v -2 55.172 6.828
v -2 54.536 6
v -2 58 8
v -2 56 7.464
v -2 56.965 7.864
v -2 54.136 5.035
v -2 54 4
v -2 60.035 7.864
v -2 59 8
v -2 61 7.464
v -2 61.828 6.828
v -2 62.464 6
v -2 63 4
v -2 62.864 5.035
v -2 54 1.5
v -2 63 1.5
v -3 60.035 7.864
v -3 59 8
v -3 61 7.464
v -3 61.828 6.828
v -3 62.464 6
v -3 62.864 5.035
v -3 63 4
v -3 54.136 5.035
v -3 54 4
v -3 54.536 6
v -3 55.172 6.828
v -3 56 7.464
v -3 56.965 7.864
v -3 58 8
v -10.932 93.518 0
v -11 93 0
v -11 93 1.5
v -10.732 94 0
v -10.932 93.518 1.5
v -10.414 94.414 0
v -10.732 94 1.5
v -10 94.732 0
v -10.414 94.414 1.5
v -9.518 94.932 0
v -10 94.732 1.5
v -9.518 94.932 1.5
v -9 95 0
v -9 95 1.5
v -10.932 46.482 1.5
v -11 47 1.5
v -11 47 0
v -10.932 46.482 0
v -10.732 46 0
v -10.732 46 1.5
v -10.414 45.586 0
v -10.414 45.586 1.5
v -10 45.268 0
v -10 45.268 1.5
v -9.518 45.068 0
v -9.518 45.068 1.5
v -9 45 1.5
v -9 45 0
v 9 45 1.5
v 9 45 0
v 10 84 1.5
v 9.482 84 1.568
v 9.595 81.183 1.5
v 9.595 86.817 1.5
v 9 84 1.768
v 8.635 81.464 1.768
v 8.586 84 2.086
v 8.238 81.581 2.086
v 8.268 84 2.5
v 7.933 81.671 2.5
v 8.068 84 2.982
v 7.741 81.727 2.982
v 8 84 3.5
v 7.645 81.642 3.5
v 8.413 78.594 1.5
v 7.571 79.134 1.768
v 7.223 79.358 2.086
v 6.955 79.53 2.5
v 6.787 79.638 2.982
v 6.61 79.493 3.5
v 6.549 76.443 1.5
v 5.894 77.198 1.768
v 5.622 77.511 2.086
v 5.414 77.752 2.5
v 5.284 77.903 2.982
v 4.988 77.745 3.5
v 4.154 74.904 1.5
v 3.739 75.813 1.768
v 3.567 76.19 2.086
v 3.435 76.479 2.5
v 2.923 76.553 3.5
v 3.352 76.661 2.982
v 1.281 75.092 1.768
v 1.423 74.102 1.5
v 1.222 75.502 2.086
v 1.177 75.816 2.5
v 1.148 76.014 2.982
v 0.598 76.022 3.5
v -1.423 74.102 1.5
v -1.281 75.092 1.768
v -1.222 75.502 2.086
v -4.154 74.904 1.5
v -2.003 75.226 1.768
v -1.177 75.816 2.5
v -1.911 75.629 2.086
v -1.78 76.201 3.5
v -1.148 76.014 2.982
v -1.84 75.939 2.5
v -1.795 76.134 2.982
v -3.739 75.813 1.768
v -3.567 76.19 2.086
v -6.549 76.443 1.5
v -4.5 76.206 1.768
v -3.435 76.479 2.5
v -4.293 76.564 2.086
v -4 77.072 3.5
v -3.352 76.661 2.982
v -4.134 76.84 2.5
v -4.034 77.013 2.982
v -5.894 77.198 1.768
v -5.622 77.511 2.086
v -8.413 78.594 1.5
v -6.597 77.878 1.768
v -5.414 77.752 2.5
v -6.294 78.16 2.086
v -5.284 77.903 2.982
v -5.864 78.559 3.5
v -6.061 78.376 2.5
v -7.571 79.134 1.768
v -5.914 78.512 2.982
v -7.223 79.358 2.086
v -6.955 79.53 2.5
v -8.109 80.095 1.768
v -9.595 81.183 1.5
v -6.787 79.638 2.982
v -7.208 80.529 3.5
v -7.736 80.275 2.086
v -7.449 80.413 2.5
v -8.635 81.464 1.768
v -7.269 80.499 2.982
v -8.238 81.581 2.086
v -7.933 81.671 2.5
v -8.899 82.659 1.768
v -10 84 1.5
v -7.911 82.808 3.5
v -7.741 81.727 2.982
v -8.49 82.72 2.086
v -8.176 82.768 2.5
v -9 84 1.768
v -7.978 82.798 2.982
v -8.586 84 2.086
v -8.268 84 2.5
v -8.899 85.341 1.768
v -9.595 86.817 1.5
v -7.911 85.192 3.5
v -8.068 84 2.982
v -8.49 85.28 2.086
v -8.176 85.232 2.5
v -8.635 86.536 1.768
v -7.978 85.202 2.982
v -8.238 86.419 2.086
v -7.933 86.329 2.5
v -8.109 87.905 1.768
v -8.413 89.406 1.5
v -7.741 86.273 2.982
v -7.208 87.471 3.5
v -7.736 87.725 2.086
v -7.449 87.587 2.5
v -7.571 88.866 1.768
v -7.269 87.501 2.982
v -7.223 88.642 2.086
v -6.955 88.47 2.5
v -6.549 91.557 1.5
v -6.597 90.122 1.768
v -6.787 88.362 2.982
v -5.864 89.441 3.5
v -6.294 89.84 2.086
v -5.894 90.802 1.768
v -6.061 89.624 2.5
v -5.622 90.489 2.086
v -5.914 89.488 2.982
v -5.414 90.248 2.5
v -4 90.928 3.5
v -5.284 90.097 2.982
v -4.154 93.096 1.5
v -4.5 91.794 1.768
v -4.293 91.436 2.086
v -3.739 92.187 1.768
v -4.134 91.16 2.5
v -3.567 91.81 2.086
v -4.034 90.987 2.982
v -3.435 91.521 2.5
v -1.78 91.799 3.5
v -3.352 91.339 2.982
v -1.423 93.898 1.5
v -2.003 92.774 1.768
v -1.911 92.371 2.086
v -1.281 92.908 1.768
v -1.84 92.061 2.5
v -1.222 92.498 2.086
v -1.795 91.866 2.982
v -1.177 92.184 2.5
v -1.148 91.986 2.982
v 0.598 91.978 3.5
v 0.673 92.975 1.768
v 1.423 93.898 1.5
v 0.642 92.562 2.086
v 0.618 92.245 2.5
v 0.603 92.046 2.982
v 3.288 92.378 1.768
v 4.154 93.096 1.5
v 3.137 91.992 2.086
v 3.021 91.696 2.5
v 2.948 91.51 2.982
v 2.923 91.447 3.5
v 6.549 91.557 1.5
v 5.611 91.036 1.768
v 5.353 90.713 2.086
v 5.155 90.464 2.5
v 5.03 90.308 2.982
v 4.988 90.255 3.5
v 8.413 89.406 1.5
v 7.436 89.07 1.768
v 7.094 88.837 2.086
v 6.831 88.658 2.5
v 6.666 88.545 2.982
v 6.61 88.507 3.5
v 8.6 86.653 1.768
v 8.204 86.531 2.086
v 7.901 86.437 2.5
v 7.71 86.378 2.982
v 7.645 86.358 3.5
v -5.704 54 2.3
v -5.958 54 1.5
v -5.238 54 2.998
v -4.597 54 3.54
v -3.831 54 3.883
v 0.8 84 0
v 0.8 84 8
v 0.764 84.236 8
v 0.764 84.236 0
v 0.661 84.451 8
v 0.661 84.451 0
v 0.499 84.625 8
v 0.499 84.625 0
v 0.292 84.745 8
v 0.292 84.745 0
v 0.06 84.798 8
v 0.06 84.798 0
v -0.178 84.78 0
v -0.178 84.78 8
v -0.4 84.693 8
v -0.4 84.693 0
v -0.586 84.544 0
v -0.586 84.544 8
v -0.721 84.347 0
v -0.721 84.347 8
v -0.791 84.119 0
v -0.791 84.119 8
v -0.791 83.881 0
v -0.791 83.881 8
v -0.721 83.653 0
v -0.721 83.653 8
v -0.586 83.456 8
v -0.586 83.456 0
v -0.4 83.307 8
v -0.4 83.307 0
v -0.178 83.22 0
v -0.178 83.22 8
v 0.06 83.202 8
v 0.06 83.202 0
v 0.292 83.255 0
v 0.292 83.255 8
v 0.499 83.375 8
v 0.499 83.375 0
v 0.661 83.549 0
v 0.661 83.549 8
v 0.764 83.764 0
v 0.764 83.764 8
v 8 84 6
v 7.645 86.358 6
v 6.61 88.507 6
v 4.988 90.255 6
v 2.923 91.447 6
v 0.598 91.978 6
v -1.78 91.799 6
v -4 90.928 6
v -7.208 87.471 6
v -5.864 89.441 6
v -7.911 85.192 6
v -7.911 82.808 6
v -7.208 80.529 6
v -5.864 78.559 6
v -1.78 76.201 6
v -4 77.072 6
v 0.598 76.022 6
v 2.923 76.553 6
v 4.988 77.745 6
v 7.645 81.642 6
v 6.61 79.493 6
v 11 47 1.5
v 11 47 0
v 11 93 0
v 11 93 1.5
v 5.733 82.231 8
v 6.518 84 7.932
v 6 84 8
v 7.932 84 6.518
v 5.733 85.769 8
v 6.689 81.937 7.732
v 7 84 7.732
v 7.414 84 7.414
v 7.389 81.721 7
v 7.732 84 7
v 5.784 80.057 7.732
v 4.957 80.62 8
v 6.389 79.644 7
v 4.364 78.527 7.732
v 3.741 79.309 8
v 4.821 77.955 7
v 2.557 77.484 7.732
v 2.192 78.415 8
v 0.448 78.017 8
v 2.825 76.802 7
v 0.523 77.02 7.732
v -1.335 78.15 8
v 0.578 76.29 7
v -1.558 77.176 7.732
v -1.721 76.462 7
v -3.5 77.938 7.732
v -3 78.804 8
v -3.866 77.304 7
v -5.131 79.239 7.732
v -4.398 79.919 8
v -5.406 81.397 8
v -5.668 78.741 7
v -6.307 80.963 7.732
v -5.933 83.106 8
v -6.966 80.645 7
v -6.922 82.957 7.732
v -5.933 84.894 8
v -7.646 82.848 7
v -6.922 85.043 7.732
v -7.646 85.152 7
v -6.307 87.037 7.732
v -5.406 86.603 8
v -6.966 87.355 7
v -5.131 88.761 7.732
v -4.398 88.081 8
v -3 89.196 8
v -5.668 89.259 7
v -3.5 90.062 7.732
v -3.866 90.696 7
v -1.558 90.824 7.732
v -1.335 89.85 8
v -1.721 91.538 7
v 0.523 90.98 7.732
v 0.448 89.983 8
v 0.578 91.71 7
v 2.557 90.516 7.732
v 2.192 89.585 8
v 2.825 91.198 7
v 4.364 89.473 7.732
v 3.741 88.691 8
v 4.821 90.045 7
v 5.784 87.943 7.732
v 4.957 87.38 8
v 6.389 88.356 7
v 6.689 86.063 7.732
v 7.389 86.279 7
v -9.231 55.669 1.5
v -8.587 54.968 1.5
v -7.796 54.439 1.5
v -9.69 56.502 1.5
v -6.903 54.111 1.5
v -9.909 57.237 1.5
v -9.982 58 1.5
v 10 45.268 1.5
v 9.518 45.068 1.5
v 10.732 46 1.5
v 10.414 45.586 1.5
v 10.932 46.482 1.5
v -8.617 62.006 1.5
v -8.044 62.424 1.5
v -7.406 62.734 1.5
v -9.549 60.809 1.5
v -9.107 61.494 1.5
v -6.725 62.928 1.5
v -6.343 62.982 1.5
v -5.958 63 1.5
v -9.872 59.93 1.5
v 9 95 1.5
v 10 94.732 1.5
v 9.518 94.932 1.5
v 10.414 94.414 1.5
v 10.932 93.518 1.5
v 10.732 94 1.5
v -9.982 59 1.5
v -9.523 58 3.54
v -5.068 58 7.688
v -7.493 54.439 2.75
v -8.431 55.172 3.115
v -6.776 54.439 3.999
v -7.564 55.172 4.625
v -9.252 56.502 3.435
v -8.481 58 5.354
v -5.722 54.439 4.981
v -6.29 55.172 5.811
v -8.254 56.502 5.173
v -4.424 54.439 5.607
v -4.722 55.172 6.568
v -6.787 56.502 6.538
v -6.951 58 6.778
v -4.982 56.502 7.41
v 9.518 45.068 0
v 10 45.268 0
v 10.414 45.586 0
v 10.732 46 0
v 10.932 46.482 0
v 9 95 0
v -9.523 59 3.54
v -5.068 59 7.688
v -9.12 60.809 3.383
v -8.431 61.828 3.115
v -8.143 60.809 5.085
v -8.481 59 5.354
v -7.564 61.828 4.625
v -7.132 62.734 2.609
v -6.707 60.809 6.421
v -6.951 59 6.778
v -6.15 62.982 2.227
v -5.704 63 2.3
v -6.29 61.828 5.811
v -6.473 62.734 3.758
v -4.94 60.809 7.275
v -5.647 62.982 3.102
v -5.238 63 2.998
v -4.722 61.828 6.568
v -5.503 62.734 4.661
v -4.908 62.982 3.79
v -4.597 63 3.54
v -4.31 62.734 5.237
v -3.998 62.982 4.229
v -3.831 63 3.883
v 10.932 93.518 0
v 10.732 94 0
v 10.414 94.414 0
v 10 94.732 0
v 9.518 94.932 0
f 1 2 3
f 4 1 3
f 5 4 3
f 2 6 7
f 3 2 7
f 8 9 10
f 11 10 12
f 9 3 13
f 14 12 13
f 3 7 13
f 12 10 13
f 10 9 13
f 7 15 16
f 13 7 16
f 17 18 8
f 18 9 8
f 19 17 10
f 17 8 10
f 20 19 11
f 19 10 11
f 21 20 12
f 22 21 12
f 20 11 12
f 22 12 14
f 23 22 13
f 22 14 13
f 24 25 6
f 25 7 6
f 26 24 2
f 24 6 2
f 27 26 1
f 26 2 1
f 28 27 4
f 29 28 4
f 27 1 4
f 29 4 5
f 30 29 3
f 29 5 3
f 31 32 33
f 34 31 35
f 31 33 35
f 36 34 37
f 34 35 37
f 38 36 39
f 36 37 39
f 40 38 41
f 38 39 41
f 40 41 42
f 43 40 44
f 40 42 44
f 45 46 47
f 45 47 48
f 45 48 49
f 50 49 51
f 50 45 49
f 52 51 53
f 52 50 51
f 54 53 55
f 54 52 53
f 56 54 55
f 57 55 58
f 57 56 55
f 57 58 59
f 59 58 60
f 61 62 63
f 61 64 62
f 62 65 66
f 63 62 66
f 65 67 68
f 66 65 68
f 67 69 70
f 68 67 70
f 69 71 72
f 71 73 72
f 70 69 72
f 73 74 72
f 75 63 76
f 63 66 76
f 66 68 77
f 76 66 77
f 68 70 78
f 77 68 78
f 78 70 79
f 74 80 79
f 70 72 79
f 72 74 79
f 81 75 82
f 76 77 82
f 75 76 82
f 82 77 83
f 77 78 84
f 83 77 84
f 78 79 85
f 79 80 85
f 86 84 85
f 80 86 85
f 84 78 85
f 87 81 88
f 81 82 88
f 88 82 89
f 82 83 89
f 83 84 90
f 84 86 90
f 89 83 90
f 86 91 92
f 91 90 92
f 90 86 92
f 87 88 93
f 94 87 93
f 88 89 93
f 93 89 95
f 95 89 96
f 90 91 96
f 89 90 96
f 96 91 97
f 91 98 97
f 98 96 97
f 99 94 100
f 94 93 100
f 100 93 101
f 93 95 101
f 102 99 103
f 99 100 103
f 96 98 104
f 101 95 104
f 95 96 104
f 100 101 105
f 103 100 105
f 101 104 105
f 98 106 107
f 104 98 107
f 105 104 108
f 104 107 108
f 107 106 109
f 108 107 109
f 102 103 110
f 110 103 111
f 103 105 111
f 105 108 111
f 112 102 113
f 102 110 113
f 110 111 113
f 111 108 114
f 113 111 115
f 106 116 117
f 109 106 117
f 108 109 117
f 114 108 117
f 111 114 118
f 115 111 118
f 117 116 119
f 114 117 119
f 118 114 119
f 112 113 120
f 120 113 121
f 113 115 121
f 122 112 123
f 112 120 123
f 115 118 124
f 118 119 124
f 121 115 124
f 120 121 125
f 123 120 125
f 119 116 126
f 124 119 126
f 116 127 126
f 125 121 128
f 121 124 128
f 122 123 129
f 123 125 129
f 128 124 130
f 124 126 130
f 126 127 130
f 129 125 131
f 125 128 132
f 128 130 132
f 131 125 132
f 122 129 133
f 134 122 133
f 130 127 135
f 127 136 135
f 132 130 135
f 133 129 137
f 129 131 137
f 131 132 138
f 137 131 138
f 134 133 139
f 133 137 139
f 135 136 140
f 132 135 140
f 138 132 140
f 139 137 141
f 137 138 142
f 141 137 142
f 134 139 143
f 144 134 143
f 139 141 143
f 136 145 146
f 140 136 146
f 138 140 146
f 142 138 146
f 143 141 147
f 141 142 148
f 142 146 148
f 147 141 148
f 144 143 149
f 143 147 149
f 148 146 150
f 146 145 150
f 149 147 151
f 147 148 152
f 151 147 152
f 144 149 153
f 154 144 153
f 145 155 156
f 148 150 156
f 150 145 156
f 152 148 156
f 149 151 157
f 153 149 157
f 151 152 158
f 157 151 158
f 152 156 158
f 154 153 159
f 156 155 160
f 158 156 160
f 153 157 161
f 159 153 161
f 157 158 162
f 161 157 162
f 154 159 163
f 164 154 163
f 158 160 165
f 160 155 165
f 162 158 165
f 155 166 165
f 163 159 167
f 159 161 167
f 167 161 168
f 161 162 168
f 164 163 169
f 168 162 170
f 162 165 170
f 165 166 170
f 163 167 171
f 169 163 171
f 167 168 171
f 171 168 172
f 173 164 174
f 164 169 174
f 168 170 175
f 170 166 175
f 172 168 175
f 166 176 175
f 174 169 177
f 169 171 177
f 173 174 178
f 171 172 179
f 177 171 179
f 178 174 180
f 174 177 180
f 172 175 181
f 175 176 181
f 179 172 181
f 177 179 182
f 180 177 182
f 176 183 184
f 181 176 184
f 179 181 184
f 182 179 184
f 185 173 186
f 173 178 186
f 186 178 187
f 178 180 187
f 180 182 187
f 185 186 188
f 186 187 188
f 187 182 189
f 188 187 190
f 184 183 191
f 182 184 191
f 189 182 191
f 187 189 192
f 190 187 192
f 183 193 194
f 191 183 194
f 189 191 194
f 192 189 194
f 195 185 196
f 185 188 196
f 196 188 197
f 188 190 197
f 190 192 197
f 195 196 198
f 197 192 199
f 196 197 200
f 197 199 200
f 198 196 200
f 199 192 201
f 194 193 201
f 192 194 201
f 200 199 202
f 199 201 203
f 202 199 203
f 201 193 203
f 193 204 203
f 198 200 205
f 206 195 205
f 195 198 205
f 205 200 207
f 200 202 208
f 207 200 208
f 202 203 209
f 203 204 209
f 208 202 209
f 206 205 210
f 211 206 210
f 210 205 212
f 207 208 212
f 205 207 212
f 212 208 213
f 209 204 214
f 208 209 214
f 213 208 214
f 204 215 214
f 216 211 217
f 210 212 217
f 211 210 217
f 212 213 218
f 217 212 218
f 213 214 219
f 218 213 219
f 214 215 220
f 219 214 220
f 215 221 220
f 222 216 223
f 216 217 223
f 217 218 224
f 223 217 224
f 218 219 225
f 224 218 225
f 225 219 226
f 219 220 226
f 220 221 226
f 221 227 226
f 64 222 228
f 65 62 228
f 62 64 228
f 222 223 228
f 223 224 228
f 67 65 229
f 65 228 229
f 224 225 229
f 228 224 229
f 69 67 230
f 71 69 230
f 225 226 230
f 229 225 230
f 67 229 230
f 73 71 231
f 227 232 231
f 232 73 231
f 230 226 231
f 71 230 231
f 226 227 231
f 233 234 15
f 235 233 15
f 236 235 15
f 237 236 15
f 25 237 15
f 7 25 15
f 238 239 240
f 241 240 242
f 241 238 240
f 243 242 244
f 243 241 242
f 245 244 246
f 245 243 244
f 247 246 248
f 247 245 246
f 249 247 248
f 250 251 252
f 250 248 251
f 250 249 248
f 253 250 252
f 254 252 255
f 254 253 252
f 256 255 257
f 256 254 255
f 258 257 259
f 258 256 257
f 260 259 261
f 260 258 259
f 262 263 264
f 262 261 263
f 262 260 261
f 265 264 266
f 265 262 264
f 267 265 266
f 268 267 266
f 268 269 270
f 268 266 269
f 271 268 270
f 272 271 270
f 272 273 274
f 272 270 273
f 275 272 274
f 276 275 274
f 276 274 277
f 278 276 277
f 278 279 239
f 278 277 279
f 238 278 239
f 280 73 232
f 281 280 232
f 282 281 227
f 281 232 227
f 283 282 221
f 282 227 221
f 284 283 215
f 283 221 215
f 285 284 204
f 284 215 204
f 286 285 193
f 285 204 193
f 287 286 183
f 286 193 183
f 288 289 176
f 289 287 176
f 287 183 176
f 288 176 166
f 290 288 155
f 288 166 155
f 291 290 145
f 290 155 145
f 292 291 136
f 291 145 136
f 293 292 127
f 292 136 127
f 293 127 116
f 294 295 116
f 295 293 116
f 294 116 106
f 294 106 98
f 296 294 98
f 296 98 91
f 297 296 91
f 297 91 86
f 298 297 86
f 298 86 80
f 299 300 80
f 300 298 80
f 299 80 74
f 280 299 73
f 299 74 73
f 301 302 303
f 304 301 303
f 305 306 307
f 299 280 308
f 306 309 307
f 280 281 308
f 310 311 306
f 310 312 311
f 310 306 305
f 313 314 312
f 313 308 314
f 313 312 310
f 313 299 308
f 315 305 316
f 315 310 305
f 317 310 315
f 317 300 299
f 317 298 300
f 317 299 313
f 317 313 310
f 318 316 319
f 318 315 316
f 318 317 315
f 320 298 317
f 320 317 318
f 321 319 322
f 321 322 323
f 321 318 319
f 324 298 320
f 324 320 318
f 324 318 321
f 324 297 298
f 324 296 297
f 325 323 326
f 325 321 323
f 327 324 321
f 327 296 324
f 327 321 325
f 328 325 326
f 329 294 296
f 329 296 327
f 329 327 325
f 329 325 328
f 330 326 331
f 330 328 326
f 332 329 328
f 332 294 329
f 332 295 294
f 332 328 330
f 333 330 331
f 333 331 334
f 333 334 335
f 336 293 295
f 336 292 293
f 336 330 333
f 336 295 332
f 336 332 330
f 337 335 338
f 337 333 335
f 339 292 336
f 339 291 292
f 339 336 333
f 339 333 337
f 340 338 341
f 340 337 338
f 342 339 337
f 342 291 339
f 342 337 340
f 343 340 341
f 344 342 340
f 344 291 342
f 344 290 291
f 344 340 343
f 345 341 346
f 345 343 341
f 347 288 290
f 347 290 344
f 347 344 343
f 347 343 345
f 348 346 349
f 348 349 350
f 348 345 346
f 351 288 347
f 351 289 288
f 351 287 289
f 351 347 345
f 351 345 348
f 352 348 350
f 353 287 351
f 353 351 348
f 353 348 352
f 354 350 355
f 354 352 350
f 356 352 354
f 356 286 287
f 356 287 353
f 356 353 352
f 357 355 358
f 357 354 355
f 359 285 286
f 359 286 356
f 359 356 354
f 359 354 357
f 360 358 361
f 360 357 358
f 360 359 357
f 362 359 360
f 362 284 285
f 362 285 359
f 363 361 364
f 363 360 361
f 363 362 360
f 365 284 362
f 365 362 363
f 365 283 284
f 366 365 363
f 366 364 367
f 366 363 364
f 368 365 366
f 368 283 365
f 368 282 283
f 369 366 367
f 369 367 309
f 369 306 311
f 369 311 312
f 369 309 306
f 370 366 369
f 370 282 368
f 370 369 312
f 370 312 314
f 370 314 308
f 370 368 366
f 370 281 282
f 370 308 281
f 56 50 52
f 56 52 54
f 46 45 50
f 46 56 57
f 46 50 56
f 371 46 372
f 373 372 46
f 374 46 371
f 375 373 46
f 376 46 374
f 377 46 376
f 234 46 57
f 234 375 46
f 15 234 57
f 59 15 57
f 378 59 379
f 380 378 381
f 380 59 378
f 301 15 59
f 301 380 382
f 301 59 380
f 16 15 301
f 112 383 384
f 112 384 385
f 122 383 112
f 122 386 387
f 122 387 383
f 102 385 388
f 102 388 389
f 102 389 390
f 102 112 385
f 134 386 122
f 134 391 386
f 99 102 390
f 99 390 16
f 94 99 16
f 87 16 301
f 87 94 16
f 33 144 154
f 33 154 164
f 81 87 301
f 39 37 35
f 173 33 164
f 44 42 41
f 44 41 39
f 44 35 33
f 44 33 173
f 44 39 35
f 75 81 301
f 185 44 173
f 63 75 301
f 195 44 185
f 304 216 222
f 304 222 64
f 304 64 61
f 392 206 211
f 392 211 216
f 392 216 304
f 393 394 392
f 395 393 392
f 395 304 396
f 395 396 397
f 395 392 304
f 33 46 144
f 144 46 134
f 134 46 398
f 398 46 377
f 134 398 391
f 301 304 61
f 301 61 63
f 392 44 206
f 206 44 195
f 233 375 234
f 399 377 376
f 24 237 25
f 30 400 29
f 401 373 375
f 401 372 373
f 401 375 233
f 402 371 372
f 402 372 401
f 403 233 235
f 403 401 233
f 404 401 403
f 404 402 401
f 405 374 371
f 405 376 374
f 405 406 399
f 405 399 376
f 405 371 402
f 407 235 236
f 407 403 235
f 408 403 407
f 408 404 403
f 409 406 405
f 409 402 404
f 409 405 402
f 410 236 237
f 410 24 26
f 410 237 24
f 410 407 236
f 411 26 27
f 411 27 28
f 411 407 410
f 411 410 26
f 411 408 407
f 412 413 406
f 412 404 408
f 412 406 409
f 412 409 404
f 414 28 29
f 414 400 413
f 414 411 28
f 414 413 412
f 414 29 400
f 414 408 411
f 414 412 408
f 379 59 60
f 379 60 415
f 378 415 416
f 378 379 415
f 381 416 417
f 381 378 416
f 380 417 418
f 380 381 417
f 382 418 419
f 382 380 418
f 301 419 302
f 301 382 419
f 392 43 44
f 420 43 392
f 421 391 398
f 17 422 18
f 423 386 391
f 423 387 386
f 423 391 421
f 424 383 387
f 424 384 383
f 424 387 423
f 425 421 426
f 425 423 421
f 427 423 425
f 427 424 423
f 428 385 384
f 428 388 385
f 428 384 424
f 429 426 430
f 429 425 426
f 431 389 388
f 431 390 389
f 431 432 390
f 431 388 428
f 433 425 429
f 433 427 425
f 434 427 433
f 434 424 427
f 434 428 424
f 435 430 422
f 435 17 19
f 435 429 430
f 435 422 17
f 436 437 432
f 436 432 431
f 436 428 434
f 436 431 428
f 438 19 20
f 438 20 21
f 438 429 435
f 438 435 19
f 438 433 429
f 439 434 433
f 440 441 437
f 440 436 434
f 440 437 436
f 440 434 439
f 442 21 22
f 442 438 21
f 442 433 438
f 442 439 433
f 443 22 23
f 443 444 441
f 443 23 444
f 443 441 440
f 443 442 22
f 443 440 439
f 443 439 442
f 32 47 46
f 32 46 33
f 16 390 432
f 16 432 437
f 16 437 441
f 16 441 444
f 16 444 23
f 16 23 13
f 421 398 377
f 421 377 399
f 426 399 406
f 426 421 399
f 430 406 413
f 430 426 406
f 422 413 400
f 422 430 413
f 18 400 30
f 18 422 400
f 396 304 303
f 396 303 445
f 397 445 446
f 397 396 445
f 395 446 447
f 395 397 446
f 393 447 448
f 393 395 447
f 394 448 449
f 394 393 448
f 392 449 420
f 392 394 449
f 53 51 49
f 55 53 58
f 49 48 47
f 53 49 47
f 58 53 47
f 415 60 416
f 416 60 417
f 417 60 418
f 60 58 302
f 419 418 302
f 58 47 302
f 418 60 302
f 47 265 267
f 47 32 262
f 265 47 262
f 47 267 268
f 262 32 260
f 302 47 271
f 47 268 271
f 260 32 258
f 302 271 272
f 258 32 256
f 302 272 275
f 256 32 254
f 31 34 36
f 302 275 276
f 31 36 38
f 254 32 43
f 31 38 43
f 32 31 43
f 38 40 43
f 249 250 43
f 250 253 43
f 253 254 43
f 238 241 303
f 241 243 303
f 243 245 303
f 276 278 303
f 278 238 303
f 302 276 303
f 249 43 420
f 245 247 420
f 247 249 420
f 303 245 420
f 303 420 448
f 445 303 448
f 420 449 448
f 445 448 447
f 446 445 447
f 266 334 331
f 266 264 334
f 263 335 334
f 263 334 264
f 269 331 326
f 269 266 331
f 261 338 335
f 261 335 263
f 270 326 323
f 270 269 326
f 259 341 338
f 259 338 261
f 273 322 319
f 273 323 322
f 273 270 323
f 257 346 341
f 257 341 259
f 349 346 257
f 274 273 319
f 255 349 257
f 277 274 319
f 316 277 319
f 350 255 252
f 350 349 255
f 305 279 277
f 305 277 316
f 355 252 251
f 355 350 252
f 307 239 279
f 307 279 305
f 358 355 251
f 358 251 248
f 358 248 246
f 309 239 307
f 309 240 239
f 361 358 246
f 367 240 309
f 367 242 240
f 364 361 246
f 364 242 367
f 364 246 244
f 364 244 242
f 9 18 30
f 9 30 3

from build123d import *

# Parameters (mm, degrees)
BOX019_W          = 8
BOX019_H          = 9
BOX019_DEPTH      = 8
FILLET027_R       = 7
FILLET028_R       = 4
CYLINDER_R        = 0.8
CYLINDER_DEPTH    = 10
CYLINDER029_R     = 8
CYLINDER029_DEPTH = 10
BOX018_W          = 22
BOX018_H          = 50
BOX018_DEPTH      = 8
FILLET025_R       = 2
BOX016_W          = 22
BOX016_H          = 50
BOX016_DEPTH      = 8
FILLET026_R       = 2
FILLET029_R       = 2


with BuildPart() as fillet028:
    # Box019 → Box019 (new body)
    with BuildSketch(Plane(origin=(-10, -30, 0), x_dir=(1, 0, 0), z_dir=(0, 0, 1))):
        with Locations((4, 4.5)):
            Rectangle(BOX019_W, BOX019_H)
    extrude(amount=BOX019_DEPTH)

    # Fillet027
    fillet027_edges = [fillet028.edges().sort_by_distance(p)[0] for p in [
        (-10, -25.5, 8),
    ]]
    fillet(fillet027_edges, radius=FILLET027_R)

    # Fillet028
    fillet028_edges = [fillet028.edges().sort_by_distance(p)[0] for p in [
        (-7.949747, -30, 5.949747),
        (-7.949747, -21, 5.949747),
    ]]
    fillet(fillet028_edges, radius=FILLET028_R)


with BuildPart() as axisholle:
    # Cylinder → Cylinder (new body)
    with BuildSketch(Plane.XY):
        Circle(CYLINDER_R)
    extrude(amount=CYLINDER_DEPTH)


with BuildPart() as axisholle001:
    # Cylinder029 → Cylinder029 (new body)
    with BuildSketch(Plane.XY):
        Circle(CYLINDER029_R)
    extrude(amount=CYLINDER029_DEPTH)


with BuildPart() as fusion014:
    # Box018 → Box018 (new body)
    with BuildSketch(Plane(origin=(-11, -39, 1.5), x_dir=(1, 0, 0), z_dir=(0, 0, 1))):
        with Locations((11, 25)):
            Rectangle(BOX018_W, BOX018_H)
    extrude(amount=BOX018_DEPTH)

    # Cut008: cut AxisHolle001
    add(axisholle001.part, mode=Mode.SUBTRACT)

    # Fillet025
    fillet025_edges = [fusion014.edges().sort_by_distance(p)[0] for p in [
        (-8, 0, 1.5),
    ]]
    fillet(fillet025_edges, radius=FILLET025_R)

    # Fusion014: union AxisHolle
    add(axisholle.part)


with BuildPart() as hindge:
    # Box016 → Box016 (new body)
    with BuildSketch(Plane(origin=(-11, -39, 0), x_dir=(1, 0, 0), z_dir=(0, 0, 1))):
        with Locations((11, 25)):
            Rectangle(BOX016_W, BOX016_H)
    extrude(amount=BOX016_DEPTH)

    # Fillet026
    fillet026_edges = [hindge.edges().sort_by_distance(p)[0] for p in [
        (-11, -39, 4),
        (-11, 11, 4),
        (11, -39, 4),
        (11, 11, 4),
    ]]
    fillet(fillet026_edges, radius=FILLET026_R)

    # Cut009: cut Fusion014
    add(fusion014.part, mode=Mode.SUBTRACT)

    # Fillet029
    fillet029_edges = [hindge.edges().sort_by_distance(p)[0] for p in [
        (-8, 0, 8),
    ]]
    fillet(fillet029_edges, radius=FILLET029_R)

    # Fusion015: union Fillet028
    add(fillet028.part)


with BuildPart() as hindge_1:
    # Fusion015 placement: moved
    add(hindge.part.moved(Location((0, 84, 0))))


solid = hindge_1.part
